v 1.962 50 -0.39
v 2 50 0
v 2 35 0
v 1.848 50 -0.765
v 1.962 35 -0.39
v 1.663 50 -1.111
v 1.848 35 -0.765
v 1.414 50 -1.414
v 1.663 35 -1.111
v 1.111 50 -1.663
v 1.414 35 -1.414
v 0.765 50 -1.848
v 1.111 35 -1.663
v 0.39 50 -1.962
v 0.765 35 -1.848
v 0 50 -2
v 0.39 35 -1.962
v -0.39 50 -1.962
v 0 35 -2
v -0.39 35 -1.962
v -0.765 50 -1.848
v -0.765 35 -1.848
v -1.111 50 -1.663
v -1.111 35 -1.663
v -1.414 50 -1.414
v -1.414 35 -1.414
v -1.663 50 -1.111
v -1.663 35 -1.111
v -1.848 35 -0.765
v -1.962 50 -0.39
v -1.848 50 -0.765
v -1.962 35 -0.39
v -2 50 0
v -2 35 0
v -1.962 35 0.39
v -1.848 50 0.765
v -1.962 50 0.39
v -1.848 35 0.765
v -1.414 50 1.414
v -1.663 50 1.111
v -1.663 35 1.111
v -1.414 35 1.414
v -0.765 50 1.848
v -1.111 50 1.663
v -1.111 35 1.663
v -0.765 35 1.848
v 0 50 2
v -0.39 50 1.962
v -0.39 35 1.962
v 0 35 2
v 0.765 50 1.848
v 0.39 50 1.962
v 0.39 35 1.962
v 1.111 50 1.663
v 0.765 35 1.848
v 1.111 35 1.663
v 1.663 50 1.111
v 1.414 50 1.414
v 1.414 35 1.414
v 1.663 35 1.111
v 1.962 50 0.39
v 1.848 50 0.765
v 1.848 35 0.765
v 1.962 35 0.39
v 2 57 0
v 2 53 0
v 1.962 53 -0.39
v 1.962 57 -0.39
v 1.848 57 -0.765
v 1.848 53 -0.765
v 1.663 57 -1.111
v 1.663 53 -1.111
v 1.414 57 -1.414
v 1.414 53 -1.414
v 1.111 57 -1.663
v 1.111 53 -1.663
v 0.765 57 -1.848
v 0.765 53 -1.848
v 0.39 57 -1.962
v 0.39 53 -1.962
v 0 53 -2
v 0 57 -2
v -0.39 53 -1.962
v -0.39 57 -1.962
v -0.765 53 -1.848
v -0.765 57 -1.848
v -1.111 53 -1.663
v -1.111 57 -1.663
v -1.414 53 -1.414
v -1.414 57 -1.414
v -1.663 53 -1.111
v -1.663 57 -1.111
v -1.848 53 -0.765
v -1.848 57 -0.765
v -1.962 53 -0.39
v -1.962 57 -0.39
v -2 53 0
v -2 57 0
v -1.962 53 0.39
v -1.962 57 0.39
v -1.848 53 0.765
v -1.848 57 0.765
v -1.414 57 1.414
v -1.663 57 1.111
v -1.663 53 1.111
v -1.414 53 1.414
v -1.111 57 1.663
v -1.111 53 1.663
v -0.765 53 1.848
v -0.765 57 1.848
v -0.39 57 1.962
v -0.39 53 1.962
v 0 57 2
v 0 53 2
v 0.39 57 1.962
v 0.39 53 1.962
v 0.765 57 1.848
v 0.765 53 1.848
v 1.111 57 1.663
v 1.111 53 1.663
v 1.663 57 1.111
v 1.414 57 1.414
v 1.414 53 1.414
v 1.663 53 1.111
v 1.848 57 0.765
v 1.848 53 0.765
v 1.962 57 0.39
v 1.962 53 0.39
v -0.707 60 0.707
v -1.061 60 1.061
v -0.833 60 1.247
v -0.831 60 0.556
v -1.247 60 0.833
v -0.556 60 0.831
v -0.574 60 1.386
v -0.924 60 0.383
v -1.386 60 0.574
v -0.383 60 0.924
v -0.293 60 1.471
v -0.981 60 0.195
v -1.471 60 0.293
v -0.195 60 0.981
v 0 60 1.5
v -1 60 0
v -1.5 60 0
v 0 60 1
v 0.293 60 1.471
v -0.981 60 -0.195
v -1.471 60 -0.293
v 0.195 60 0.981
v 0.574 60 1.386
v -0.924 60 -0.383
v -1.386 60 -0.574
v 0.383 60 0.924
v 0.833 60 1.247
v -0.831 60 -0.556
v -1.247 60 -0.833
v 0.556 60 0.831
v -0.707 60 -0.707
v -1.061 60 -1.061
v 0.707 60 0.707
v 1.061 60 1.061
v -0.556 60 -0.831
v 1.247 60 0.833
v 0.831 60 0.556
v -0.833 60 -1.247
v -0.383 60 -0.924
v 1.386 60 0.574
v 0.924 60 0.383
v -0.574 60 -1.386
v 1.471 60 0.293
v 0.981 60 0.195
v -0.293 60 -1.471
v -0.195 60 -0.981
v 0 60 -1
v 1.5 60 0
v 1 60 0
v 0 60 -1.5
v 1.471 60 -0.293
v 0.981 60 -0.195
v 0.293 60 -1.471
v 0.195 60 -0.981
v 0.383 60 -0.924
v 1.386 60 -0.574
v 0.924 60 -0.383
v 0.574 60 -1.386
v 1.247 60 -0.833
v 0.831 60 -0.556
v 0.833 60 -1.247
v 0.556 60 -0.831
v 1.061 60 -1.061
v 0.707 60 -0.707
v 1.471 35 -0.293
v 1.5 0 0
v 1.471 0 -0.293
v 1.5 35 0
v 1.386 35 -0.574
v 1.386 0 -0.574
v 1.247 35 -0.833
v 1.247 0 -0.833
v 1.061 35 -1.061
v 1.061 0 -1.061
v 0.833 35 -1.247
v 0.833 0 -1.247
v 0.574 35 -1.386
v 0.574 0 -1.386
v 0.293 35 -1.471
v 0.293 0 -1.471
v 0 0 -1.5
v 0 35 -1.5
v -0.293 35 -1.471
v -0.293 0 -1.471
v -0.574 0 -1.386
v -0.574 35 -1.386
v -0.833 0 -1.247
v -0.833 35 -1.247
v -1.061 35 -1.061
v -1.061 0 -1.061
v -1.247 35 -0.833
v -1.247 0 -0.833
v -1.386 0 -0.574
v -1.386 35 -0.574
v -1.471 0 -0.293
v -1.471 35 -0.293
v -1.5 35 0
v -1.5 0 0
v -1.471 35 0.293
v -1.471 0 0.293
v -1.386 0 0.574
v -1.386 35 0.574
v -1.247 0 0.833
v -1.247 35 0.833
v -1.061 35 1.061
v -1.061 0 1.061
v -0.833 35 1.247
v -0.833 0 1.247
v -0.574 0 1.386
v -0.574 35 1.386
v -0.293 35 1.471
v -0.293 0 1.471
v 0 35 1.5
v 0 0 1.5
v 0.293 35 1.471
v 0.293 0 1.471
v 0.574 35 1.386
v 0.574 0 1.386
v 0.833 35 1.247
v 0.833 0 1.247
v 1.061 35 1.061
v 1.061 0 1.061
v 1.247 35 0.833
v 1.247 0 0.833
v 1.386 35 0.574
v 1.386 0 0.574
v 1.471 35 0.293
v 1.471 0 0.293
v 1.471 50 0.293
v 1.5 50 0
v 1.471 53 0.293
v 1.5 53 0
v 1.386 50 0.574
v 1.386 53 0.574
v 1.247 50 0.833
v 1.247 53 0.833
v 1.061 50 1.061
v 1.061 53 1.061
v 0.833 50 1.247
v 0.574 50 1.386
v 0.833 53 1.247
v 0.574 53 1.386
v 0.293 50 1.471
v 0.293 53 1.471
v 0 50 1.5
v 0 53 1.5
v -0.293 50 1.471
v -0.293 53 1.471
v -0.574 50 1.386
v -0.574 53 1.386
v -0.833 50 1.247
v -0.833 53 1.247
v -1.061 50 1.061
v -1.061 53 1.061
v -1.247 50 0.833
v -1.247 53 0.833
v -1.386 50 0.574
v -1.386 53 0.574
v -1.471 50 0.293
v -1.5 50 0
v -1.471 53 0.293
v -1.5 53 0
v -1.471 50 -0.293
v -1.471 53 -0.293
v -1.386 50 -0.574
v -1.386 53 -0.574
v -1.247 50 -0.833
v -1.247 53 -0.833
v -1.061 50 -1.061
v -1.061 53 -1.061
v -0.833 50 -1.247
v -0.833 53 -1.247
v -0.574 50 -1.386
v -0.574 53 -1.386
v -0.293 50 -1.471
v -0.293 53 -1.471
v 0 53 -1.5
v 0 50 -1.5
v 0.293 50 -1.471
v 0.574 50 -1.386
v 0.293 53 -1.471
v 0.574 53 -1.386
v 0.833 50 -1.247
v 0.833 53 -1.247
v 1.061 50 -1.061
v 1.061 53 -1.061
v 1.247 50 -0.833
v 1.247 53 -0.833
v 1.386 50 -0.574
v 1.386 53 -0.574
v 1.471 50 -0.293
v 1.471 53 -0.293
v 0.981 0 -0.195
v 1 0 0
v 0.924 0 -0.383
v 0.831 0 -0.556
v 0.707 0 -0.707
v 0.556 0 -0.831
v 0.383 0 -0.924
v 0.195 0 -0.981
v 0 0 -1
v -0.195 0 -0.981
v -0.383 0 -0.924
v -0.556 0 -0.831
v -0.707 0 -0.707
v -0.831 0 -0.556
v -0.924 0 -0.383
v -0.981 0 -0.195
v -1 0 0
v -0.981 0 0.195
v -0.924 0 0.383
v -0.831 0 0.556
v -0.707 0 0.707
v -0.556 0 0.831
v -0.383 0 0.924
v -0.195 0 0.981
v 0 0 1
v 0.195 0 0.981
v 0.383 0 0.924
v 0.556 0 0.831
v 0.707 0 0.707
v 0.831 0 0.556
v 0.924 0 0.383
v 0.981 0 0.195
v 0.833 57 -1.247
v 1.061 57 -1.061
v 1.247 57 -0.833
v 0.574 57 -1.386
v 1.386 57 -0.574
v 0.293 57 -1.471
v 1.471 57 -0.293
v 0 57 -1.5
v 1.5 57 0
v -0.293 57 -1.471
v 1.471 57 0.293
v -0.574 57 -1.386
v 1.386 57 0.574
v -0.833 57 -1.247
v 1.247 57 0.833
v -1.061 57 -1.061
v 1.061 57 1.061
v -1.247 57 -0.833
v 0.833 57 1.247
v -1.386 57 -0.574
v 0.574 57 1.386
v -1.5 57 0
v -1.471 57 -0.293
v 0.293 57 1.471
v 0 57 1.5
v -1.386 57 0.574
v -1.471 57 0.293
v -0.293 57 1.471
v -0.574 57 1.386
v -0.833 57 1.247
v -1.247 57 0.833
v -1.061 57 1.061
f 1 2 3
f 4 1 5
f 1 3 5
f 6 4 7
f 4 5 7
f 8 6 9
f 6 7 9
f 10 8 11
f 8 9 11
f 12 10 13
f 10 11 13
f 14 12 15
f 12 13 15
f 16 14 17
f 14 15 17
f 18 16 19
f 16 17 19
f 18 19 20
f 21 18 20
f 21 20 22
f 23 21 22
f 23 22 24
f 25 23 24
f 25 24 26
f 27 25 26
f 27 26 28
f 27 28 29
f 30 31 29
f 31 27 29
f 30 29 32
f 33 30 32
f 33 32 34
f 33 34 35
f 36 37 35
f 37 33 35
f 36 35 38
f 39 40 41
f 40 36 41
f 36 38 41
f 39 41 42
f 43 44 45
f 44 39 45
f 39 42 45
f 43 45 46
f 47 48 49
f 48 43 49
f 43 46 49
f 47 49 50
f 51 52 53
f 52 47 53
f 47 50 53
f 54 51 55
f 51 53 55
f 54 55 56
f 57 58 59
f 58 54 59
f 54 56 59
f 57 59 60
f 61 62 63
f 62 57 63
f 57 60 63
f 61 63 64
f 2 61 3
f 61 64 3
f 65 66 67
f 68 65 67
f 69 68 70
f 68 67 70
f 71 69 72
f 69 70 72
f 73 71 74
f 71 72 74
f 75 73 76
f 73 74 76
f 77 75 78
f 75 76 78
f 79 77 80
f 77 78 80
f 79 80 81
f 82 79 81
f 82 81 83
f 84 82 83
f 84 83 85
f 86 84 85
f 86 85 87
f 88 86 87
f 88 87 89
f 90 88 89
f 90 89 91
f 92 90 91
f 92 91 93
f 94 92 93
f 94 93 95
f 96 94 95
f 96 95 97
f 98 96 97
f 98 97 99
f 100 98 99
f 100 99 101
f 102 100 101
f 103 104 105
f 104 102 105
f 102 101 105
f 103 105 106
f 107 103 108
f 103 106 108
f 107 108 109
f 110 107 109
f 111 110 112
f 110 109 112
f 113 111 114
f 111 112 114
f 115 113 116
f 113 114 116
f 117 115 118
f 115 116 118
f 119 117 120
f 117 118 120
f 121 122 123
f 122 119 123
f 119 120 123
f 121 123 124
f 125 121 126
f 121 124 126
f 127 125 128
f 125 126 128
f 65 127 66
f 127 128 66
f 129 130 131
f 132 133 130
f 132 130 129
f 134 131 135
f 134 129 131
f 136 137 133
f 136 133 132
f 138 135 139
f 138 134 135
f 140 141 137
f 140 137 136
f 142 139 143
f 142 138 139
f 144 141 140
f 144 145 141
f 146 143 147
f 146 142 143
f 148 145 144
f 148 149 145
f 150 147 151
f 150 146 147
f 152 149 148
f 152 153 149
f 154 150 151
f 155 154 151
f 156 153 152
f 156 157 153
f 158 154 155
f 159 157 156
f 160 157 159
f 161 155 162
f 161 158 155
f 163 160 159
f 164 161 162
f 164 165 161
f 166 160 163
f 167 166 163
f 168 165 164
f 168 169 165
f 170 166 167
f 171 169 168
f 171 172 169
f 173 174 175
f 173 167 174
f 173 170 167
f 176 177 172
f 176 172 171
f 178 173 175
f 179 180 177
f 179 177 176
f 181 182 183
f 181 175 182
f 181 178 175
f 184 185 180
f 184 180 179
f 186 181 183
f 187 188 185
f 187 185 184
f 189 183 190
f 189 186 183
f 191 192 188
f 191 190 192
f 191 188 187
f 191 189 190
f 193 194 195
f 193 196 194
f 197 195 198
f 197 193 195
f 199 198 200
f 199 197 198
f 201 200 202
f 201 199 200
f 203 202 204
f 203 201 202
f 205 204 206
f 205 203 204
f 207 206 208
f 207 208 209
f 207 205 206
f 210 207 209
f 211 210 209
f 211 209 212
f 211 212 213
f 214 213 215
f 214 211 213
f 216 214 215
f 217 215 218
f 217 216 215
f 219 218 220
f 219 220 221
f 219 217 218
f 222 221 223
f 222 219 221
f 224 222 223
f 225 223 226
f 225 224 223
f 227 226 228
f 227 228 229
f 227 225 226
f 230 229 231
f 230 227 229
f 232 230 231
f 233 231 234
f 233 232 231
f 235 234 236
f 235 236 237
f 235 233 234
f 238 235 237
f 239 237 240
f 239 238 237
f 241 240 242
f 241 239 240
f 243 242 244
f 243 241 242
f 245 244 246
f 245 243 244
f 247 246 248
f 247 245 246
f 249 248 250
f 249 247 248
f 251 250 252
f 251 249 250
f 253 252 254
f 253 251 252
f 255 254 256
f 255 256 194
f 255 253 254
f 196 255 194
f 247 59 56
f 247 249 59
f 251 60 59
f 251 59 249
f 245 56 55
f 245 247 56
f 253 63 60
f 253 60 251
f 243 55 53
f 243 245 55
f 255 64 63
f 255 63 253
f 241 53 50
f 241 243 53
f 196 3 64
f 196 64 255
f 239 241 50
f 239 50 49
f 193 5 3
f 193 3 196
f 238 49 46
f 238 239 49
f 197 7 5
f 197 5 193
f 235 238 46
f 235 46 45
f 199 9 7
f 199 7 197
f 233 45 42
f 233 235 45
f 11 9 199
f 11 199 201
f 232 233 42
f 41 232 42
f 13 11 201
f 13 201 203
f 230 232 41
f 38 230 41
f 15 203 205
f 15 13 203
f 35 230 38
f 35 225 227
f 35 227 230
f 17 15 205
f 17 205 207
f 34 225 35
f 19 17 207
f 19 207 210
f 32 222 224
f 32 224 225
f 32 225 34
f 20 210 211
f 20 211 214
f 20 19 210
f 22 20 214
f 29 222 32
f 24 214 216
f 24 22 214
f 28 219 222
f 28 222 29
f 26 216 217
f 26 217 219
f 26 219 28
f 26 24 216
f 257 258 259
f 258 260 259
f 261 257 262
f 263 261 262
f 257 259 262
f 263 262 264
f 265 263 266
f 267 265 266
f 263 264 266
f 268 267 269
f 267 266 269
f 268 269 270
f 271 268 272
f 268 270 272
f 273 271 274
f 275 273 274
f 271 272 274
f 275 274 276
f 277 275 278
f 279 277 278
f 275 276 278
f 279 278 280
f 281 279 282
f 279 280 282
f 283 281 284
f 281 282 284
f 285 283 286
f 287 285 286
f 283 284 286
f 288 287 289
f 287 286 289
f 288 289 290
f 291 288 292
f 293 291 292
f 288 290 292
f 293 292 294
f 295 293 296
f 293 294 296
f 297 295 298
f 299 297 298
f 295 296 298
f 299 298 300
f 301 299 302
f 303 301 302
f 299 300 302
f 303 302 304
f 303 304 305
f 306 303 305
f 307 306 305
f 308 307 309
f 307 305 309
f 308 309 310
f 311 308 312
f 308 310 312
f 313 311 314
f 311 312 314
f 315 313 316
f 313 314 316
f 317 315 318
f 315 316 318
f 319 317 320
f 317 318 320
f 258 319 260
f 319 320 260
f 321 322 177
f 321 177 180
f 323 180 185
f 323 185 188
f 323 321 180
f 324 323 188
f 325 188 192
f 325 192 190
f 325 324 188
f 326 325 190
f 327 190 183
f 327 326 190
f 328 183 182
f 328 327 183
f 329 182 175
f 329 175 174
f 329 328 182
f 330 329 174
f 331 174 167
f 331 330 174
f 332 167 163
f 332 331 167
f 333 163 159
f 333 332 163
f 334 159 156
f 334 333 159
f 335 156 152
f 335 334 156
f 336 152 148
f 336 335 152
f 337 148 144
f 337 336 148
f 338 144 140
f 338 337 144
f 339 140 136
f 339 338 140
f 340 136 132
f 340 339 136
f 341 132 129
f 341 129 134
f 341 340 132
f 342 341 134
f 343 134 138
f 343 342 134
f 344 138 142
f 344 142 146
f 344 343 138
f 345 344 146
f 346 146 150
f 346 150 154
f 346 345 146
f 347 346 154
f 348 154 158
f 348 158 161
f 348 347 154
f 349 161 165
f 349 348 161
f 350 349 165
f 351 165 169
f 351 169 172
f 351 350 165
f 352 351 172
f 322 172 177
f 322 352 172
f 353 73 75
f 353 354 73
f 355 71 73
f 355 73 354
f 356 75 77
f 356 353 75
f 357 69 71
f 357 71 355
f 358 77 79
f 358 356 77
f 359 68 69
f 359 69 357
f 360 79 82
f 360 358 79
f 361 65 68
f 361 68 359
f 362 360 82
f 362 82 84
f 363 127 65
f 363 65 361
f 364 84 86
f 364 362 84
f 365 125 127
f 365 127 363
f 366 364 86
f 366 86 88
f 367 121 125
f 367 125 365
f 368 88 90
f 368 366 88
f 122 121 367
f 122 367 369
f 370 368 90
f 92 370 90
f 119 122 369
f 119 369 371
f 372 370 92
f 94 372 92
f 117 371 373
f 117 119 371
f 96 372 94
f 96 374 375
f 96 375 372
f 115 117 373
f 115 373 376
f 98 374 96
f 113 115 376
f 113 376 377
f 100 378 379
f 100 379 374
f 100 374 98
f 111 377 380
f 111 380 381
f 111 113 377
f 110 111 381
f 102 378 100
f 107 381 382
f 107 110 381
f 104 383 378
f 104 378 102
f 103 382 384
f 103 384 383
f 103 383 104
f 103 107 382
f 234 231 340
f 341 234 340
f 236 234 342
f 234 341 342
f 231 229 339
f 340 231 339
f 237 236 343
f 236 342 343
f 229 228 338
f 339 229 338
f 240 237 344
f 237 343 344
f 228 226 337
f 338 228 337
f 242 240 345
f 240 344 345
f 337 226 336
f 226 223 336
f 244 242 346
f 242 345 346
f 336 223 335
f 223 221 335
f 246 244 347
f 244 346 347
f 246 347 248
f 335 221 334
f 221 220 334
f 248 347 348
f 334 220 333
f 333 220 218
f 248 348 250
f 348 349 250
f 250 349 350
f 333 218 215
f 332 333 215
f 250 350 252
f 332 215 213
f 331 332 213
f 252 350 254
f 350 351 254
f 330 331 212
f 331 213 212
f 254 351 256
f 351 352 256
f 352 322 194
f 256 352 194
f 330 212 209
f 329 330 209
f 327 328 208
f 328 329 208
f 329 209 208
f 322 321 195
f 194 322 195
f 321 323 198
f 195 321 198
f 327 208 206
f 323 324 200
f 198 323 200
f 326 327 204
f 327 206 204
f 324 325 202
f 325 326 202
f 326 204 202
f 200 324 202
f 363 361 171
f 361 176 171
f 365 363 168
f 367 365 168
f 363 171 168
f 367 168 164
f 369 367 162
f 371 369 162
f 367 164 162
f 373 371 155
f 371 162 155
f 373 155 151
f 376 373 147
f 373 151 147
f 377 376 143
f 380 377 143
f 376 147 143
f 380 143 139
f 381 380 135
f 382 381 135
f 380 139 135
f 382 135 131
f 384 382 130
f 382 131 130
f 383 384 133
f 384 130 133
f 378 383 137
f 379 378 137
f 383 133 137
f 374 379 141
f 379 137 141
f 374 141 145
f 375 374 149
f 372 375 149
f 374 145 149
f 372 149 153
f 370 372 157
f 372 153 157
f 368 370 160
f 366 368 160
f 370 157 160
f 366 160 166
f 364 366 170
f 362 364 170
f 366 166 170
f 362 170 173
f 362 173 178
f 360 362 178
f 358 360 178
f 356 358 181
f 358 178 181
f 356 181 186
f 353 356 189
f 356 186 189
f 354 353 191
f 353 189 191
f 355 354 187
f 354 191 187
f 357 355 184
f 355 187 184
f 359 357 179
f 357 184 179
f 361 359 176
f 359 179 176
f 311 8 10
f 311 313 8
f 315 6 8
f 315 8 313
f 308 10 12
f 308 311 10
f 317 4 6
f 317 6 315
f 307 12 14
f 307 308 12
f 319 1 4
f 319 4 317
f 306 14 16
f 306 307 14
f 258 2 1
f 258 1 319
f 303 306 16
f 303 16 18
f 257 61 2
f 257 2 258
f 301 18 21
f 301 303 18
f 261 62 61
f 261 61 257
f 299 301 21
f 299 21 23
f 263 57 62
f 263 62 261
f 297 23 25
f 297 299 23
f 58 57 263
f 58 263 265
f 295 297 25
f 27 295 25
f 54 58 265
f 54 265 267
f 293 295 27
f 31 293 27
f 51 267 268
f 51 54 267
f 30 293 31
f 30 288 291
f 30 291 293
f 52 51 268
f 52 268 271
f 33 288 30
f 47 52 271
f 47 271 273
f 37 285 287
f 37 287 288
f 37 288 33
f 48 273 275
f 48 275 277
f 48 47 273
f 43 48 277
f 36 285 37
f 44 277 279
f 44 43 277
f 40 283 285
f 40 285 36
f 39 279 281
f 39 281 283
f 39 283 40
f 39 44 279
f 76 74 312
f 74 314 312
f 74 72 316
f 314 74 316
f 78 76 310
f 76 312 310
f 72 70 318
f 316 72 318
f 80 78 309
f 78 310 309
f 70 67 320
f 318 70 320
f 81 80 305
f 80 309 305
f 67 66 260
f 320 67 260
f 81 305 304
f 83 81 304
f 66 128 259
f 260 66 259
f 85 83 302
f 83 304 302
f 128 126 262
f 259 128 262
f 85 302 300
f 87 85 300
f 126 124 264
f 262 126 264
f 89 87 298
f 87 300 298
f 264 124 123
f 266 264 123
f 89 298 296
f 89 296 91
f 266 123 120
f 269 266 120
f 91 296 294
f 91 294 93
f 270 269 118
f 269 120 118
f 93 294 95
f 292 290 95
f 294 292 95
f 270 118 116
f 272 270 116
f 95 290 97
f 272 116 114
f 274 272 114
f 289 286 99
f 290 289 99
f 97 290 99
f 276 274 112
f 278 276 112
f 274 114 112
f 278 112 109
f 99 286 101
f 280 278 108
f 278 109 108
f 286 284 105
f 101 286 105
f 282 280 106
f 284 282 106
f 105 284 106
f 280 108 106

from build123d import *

# Parameters (mm, degrees)
SKETCH_1_R      = 2
SKETCH_1_R_2    = 1
EXTRUDE_1_DEPTH = 60
SKETCH_2_W      = 0.5
SKETCH_2_H      = 3
SKETCH_3_W      = 0.5
SKETCH_3_H      = 35


with BuildPart() as part:
    # Эскиз1 → Бобышка-Вытянуть1 (new body)
    with BuildSketch(Plane(origin=(0, 0, 0), x_dir=(1, 0, 0), z_dir=(0, 1, 0))):
        Circle(SKETCH_1_R)
        Circle(SKETCH_1_R_2, mode=Mode.SUBTRACT)
    extrude(amount=EXTRUDE_1_DEPTH)

    # Эскиз2 → Вырез-Повернуть1 (revolve, cut)
    with BuildSketch(Plane.XY):
        with Locations((1.75, 58.5)):
            Rectangle(SKETCH_2_W, SKETCH_2_H)
        with Locations((1.75, 51.5)):
            Rectangle(SKETCH_2_W, SKETCH_2_H)
    revolve(axis=Axis((0, 60, 0), (0, -1, 0)), mode=Mode.SUBTRACT)

    # Эскиз3 → Вырез-Повернуть2 (revolve, cut)
    with BuildSketch(Plane.XY):
        with Locations((1.75, 17.5)):
            Rectangle(SKETCH_3_W, SKETCH_3_H)
    revolve(axis=Axis((0, 0, 0), (0, 1, 0)), mode=Mode.SUBTRACT)


solid = part.part
